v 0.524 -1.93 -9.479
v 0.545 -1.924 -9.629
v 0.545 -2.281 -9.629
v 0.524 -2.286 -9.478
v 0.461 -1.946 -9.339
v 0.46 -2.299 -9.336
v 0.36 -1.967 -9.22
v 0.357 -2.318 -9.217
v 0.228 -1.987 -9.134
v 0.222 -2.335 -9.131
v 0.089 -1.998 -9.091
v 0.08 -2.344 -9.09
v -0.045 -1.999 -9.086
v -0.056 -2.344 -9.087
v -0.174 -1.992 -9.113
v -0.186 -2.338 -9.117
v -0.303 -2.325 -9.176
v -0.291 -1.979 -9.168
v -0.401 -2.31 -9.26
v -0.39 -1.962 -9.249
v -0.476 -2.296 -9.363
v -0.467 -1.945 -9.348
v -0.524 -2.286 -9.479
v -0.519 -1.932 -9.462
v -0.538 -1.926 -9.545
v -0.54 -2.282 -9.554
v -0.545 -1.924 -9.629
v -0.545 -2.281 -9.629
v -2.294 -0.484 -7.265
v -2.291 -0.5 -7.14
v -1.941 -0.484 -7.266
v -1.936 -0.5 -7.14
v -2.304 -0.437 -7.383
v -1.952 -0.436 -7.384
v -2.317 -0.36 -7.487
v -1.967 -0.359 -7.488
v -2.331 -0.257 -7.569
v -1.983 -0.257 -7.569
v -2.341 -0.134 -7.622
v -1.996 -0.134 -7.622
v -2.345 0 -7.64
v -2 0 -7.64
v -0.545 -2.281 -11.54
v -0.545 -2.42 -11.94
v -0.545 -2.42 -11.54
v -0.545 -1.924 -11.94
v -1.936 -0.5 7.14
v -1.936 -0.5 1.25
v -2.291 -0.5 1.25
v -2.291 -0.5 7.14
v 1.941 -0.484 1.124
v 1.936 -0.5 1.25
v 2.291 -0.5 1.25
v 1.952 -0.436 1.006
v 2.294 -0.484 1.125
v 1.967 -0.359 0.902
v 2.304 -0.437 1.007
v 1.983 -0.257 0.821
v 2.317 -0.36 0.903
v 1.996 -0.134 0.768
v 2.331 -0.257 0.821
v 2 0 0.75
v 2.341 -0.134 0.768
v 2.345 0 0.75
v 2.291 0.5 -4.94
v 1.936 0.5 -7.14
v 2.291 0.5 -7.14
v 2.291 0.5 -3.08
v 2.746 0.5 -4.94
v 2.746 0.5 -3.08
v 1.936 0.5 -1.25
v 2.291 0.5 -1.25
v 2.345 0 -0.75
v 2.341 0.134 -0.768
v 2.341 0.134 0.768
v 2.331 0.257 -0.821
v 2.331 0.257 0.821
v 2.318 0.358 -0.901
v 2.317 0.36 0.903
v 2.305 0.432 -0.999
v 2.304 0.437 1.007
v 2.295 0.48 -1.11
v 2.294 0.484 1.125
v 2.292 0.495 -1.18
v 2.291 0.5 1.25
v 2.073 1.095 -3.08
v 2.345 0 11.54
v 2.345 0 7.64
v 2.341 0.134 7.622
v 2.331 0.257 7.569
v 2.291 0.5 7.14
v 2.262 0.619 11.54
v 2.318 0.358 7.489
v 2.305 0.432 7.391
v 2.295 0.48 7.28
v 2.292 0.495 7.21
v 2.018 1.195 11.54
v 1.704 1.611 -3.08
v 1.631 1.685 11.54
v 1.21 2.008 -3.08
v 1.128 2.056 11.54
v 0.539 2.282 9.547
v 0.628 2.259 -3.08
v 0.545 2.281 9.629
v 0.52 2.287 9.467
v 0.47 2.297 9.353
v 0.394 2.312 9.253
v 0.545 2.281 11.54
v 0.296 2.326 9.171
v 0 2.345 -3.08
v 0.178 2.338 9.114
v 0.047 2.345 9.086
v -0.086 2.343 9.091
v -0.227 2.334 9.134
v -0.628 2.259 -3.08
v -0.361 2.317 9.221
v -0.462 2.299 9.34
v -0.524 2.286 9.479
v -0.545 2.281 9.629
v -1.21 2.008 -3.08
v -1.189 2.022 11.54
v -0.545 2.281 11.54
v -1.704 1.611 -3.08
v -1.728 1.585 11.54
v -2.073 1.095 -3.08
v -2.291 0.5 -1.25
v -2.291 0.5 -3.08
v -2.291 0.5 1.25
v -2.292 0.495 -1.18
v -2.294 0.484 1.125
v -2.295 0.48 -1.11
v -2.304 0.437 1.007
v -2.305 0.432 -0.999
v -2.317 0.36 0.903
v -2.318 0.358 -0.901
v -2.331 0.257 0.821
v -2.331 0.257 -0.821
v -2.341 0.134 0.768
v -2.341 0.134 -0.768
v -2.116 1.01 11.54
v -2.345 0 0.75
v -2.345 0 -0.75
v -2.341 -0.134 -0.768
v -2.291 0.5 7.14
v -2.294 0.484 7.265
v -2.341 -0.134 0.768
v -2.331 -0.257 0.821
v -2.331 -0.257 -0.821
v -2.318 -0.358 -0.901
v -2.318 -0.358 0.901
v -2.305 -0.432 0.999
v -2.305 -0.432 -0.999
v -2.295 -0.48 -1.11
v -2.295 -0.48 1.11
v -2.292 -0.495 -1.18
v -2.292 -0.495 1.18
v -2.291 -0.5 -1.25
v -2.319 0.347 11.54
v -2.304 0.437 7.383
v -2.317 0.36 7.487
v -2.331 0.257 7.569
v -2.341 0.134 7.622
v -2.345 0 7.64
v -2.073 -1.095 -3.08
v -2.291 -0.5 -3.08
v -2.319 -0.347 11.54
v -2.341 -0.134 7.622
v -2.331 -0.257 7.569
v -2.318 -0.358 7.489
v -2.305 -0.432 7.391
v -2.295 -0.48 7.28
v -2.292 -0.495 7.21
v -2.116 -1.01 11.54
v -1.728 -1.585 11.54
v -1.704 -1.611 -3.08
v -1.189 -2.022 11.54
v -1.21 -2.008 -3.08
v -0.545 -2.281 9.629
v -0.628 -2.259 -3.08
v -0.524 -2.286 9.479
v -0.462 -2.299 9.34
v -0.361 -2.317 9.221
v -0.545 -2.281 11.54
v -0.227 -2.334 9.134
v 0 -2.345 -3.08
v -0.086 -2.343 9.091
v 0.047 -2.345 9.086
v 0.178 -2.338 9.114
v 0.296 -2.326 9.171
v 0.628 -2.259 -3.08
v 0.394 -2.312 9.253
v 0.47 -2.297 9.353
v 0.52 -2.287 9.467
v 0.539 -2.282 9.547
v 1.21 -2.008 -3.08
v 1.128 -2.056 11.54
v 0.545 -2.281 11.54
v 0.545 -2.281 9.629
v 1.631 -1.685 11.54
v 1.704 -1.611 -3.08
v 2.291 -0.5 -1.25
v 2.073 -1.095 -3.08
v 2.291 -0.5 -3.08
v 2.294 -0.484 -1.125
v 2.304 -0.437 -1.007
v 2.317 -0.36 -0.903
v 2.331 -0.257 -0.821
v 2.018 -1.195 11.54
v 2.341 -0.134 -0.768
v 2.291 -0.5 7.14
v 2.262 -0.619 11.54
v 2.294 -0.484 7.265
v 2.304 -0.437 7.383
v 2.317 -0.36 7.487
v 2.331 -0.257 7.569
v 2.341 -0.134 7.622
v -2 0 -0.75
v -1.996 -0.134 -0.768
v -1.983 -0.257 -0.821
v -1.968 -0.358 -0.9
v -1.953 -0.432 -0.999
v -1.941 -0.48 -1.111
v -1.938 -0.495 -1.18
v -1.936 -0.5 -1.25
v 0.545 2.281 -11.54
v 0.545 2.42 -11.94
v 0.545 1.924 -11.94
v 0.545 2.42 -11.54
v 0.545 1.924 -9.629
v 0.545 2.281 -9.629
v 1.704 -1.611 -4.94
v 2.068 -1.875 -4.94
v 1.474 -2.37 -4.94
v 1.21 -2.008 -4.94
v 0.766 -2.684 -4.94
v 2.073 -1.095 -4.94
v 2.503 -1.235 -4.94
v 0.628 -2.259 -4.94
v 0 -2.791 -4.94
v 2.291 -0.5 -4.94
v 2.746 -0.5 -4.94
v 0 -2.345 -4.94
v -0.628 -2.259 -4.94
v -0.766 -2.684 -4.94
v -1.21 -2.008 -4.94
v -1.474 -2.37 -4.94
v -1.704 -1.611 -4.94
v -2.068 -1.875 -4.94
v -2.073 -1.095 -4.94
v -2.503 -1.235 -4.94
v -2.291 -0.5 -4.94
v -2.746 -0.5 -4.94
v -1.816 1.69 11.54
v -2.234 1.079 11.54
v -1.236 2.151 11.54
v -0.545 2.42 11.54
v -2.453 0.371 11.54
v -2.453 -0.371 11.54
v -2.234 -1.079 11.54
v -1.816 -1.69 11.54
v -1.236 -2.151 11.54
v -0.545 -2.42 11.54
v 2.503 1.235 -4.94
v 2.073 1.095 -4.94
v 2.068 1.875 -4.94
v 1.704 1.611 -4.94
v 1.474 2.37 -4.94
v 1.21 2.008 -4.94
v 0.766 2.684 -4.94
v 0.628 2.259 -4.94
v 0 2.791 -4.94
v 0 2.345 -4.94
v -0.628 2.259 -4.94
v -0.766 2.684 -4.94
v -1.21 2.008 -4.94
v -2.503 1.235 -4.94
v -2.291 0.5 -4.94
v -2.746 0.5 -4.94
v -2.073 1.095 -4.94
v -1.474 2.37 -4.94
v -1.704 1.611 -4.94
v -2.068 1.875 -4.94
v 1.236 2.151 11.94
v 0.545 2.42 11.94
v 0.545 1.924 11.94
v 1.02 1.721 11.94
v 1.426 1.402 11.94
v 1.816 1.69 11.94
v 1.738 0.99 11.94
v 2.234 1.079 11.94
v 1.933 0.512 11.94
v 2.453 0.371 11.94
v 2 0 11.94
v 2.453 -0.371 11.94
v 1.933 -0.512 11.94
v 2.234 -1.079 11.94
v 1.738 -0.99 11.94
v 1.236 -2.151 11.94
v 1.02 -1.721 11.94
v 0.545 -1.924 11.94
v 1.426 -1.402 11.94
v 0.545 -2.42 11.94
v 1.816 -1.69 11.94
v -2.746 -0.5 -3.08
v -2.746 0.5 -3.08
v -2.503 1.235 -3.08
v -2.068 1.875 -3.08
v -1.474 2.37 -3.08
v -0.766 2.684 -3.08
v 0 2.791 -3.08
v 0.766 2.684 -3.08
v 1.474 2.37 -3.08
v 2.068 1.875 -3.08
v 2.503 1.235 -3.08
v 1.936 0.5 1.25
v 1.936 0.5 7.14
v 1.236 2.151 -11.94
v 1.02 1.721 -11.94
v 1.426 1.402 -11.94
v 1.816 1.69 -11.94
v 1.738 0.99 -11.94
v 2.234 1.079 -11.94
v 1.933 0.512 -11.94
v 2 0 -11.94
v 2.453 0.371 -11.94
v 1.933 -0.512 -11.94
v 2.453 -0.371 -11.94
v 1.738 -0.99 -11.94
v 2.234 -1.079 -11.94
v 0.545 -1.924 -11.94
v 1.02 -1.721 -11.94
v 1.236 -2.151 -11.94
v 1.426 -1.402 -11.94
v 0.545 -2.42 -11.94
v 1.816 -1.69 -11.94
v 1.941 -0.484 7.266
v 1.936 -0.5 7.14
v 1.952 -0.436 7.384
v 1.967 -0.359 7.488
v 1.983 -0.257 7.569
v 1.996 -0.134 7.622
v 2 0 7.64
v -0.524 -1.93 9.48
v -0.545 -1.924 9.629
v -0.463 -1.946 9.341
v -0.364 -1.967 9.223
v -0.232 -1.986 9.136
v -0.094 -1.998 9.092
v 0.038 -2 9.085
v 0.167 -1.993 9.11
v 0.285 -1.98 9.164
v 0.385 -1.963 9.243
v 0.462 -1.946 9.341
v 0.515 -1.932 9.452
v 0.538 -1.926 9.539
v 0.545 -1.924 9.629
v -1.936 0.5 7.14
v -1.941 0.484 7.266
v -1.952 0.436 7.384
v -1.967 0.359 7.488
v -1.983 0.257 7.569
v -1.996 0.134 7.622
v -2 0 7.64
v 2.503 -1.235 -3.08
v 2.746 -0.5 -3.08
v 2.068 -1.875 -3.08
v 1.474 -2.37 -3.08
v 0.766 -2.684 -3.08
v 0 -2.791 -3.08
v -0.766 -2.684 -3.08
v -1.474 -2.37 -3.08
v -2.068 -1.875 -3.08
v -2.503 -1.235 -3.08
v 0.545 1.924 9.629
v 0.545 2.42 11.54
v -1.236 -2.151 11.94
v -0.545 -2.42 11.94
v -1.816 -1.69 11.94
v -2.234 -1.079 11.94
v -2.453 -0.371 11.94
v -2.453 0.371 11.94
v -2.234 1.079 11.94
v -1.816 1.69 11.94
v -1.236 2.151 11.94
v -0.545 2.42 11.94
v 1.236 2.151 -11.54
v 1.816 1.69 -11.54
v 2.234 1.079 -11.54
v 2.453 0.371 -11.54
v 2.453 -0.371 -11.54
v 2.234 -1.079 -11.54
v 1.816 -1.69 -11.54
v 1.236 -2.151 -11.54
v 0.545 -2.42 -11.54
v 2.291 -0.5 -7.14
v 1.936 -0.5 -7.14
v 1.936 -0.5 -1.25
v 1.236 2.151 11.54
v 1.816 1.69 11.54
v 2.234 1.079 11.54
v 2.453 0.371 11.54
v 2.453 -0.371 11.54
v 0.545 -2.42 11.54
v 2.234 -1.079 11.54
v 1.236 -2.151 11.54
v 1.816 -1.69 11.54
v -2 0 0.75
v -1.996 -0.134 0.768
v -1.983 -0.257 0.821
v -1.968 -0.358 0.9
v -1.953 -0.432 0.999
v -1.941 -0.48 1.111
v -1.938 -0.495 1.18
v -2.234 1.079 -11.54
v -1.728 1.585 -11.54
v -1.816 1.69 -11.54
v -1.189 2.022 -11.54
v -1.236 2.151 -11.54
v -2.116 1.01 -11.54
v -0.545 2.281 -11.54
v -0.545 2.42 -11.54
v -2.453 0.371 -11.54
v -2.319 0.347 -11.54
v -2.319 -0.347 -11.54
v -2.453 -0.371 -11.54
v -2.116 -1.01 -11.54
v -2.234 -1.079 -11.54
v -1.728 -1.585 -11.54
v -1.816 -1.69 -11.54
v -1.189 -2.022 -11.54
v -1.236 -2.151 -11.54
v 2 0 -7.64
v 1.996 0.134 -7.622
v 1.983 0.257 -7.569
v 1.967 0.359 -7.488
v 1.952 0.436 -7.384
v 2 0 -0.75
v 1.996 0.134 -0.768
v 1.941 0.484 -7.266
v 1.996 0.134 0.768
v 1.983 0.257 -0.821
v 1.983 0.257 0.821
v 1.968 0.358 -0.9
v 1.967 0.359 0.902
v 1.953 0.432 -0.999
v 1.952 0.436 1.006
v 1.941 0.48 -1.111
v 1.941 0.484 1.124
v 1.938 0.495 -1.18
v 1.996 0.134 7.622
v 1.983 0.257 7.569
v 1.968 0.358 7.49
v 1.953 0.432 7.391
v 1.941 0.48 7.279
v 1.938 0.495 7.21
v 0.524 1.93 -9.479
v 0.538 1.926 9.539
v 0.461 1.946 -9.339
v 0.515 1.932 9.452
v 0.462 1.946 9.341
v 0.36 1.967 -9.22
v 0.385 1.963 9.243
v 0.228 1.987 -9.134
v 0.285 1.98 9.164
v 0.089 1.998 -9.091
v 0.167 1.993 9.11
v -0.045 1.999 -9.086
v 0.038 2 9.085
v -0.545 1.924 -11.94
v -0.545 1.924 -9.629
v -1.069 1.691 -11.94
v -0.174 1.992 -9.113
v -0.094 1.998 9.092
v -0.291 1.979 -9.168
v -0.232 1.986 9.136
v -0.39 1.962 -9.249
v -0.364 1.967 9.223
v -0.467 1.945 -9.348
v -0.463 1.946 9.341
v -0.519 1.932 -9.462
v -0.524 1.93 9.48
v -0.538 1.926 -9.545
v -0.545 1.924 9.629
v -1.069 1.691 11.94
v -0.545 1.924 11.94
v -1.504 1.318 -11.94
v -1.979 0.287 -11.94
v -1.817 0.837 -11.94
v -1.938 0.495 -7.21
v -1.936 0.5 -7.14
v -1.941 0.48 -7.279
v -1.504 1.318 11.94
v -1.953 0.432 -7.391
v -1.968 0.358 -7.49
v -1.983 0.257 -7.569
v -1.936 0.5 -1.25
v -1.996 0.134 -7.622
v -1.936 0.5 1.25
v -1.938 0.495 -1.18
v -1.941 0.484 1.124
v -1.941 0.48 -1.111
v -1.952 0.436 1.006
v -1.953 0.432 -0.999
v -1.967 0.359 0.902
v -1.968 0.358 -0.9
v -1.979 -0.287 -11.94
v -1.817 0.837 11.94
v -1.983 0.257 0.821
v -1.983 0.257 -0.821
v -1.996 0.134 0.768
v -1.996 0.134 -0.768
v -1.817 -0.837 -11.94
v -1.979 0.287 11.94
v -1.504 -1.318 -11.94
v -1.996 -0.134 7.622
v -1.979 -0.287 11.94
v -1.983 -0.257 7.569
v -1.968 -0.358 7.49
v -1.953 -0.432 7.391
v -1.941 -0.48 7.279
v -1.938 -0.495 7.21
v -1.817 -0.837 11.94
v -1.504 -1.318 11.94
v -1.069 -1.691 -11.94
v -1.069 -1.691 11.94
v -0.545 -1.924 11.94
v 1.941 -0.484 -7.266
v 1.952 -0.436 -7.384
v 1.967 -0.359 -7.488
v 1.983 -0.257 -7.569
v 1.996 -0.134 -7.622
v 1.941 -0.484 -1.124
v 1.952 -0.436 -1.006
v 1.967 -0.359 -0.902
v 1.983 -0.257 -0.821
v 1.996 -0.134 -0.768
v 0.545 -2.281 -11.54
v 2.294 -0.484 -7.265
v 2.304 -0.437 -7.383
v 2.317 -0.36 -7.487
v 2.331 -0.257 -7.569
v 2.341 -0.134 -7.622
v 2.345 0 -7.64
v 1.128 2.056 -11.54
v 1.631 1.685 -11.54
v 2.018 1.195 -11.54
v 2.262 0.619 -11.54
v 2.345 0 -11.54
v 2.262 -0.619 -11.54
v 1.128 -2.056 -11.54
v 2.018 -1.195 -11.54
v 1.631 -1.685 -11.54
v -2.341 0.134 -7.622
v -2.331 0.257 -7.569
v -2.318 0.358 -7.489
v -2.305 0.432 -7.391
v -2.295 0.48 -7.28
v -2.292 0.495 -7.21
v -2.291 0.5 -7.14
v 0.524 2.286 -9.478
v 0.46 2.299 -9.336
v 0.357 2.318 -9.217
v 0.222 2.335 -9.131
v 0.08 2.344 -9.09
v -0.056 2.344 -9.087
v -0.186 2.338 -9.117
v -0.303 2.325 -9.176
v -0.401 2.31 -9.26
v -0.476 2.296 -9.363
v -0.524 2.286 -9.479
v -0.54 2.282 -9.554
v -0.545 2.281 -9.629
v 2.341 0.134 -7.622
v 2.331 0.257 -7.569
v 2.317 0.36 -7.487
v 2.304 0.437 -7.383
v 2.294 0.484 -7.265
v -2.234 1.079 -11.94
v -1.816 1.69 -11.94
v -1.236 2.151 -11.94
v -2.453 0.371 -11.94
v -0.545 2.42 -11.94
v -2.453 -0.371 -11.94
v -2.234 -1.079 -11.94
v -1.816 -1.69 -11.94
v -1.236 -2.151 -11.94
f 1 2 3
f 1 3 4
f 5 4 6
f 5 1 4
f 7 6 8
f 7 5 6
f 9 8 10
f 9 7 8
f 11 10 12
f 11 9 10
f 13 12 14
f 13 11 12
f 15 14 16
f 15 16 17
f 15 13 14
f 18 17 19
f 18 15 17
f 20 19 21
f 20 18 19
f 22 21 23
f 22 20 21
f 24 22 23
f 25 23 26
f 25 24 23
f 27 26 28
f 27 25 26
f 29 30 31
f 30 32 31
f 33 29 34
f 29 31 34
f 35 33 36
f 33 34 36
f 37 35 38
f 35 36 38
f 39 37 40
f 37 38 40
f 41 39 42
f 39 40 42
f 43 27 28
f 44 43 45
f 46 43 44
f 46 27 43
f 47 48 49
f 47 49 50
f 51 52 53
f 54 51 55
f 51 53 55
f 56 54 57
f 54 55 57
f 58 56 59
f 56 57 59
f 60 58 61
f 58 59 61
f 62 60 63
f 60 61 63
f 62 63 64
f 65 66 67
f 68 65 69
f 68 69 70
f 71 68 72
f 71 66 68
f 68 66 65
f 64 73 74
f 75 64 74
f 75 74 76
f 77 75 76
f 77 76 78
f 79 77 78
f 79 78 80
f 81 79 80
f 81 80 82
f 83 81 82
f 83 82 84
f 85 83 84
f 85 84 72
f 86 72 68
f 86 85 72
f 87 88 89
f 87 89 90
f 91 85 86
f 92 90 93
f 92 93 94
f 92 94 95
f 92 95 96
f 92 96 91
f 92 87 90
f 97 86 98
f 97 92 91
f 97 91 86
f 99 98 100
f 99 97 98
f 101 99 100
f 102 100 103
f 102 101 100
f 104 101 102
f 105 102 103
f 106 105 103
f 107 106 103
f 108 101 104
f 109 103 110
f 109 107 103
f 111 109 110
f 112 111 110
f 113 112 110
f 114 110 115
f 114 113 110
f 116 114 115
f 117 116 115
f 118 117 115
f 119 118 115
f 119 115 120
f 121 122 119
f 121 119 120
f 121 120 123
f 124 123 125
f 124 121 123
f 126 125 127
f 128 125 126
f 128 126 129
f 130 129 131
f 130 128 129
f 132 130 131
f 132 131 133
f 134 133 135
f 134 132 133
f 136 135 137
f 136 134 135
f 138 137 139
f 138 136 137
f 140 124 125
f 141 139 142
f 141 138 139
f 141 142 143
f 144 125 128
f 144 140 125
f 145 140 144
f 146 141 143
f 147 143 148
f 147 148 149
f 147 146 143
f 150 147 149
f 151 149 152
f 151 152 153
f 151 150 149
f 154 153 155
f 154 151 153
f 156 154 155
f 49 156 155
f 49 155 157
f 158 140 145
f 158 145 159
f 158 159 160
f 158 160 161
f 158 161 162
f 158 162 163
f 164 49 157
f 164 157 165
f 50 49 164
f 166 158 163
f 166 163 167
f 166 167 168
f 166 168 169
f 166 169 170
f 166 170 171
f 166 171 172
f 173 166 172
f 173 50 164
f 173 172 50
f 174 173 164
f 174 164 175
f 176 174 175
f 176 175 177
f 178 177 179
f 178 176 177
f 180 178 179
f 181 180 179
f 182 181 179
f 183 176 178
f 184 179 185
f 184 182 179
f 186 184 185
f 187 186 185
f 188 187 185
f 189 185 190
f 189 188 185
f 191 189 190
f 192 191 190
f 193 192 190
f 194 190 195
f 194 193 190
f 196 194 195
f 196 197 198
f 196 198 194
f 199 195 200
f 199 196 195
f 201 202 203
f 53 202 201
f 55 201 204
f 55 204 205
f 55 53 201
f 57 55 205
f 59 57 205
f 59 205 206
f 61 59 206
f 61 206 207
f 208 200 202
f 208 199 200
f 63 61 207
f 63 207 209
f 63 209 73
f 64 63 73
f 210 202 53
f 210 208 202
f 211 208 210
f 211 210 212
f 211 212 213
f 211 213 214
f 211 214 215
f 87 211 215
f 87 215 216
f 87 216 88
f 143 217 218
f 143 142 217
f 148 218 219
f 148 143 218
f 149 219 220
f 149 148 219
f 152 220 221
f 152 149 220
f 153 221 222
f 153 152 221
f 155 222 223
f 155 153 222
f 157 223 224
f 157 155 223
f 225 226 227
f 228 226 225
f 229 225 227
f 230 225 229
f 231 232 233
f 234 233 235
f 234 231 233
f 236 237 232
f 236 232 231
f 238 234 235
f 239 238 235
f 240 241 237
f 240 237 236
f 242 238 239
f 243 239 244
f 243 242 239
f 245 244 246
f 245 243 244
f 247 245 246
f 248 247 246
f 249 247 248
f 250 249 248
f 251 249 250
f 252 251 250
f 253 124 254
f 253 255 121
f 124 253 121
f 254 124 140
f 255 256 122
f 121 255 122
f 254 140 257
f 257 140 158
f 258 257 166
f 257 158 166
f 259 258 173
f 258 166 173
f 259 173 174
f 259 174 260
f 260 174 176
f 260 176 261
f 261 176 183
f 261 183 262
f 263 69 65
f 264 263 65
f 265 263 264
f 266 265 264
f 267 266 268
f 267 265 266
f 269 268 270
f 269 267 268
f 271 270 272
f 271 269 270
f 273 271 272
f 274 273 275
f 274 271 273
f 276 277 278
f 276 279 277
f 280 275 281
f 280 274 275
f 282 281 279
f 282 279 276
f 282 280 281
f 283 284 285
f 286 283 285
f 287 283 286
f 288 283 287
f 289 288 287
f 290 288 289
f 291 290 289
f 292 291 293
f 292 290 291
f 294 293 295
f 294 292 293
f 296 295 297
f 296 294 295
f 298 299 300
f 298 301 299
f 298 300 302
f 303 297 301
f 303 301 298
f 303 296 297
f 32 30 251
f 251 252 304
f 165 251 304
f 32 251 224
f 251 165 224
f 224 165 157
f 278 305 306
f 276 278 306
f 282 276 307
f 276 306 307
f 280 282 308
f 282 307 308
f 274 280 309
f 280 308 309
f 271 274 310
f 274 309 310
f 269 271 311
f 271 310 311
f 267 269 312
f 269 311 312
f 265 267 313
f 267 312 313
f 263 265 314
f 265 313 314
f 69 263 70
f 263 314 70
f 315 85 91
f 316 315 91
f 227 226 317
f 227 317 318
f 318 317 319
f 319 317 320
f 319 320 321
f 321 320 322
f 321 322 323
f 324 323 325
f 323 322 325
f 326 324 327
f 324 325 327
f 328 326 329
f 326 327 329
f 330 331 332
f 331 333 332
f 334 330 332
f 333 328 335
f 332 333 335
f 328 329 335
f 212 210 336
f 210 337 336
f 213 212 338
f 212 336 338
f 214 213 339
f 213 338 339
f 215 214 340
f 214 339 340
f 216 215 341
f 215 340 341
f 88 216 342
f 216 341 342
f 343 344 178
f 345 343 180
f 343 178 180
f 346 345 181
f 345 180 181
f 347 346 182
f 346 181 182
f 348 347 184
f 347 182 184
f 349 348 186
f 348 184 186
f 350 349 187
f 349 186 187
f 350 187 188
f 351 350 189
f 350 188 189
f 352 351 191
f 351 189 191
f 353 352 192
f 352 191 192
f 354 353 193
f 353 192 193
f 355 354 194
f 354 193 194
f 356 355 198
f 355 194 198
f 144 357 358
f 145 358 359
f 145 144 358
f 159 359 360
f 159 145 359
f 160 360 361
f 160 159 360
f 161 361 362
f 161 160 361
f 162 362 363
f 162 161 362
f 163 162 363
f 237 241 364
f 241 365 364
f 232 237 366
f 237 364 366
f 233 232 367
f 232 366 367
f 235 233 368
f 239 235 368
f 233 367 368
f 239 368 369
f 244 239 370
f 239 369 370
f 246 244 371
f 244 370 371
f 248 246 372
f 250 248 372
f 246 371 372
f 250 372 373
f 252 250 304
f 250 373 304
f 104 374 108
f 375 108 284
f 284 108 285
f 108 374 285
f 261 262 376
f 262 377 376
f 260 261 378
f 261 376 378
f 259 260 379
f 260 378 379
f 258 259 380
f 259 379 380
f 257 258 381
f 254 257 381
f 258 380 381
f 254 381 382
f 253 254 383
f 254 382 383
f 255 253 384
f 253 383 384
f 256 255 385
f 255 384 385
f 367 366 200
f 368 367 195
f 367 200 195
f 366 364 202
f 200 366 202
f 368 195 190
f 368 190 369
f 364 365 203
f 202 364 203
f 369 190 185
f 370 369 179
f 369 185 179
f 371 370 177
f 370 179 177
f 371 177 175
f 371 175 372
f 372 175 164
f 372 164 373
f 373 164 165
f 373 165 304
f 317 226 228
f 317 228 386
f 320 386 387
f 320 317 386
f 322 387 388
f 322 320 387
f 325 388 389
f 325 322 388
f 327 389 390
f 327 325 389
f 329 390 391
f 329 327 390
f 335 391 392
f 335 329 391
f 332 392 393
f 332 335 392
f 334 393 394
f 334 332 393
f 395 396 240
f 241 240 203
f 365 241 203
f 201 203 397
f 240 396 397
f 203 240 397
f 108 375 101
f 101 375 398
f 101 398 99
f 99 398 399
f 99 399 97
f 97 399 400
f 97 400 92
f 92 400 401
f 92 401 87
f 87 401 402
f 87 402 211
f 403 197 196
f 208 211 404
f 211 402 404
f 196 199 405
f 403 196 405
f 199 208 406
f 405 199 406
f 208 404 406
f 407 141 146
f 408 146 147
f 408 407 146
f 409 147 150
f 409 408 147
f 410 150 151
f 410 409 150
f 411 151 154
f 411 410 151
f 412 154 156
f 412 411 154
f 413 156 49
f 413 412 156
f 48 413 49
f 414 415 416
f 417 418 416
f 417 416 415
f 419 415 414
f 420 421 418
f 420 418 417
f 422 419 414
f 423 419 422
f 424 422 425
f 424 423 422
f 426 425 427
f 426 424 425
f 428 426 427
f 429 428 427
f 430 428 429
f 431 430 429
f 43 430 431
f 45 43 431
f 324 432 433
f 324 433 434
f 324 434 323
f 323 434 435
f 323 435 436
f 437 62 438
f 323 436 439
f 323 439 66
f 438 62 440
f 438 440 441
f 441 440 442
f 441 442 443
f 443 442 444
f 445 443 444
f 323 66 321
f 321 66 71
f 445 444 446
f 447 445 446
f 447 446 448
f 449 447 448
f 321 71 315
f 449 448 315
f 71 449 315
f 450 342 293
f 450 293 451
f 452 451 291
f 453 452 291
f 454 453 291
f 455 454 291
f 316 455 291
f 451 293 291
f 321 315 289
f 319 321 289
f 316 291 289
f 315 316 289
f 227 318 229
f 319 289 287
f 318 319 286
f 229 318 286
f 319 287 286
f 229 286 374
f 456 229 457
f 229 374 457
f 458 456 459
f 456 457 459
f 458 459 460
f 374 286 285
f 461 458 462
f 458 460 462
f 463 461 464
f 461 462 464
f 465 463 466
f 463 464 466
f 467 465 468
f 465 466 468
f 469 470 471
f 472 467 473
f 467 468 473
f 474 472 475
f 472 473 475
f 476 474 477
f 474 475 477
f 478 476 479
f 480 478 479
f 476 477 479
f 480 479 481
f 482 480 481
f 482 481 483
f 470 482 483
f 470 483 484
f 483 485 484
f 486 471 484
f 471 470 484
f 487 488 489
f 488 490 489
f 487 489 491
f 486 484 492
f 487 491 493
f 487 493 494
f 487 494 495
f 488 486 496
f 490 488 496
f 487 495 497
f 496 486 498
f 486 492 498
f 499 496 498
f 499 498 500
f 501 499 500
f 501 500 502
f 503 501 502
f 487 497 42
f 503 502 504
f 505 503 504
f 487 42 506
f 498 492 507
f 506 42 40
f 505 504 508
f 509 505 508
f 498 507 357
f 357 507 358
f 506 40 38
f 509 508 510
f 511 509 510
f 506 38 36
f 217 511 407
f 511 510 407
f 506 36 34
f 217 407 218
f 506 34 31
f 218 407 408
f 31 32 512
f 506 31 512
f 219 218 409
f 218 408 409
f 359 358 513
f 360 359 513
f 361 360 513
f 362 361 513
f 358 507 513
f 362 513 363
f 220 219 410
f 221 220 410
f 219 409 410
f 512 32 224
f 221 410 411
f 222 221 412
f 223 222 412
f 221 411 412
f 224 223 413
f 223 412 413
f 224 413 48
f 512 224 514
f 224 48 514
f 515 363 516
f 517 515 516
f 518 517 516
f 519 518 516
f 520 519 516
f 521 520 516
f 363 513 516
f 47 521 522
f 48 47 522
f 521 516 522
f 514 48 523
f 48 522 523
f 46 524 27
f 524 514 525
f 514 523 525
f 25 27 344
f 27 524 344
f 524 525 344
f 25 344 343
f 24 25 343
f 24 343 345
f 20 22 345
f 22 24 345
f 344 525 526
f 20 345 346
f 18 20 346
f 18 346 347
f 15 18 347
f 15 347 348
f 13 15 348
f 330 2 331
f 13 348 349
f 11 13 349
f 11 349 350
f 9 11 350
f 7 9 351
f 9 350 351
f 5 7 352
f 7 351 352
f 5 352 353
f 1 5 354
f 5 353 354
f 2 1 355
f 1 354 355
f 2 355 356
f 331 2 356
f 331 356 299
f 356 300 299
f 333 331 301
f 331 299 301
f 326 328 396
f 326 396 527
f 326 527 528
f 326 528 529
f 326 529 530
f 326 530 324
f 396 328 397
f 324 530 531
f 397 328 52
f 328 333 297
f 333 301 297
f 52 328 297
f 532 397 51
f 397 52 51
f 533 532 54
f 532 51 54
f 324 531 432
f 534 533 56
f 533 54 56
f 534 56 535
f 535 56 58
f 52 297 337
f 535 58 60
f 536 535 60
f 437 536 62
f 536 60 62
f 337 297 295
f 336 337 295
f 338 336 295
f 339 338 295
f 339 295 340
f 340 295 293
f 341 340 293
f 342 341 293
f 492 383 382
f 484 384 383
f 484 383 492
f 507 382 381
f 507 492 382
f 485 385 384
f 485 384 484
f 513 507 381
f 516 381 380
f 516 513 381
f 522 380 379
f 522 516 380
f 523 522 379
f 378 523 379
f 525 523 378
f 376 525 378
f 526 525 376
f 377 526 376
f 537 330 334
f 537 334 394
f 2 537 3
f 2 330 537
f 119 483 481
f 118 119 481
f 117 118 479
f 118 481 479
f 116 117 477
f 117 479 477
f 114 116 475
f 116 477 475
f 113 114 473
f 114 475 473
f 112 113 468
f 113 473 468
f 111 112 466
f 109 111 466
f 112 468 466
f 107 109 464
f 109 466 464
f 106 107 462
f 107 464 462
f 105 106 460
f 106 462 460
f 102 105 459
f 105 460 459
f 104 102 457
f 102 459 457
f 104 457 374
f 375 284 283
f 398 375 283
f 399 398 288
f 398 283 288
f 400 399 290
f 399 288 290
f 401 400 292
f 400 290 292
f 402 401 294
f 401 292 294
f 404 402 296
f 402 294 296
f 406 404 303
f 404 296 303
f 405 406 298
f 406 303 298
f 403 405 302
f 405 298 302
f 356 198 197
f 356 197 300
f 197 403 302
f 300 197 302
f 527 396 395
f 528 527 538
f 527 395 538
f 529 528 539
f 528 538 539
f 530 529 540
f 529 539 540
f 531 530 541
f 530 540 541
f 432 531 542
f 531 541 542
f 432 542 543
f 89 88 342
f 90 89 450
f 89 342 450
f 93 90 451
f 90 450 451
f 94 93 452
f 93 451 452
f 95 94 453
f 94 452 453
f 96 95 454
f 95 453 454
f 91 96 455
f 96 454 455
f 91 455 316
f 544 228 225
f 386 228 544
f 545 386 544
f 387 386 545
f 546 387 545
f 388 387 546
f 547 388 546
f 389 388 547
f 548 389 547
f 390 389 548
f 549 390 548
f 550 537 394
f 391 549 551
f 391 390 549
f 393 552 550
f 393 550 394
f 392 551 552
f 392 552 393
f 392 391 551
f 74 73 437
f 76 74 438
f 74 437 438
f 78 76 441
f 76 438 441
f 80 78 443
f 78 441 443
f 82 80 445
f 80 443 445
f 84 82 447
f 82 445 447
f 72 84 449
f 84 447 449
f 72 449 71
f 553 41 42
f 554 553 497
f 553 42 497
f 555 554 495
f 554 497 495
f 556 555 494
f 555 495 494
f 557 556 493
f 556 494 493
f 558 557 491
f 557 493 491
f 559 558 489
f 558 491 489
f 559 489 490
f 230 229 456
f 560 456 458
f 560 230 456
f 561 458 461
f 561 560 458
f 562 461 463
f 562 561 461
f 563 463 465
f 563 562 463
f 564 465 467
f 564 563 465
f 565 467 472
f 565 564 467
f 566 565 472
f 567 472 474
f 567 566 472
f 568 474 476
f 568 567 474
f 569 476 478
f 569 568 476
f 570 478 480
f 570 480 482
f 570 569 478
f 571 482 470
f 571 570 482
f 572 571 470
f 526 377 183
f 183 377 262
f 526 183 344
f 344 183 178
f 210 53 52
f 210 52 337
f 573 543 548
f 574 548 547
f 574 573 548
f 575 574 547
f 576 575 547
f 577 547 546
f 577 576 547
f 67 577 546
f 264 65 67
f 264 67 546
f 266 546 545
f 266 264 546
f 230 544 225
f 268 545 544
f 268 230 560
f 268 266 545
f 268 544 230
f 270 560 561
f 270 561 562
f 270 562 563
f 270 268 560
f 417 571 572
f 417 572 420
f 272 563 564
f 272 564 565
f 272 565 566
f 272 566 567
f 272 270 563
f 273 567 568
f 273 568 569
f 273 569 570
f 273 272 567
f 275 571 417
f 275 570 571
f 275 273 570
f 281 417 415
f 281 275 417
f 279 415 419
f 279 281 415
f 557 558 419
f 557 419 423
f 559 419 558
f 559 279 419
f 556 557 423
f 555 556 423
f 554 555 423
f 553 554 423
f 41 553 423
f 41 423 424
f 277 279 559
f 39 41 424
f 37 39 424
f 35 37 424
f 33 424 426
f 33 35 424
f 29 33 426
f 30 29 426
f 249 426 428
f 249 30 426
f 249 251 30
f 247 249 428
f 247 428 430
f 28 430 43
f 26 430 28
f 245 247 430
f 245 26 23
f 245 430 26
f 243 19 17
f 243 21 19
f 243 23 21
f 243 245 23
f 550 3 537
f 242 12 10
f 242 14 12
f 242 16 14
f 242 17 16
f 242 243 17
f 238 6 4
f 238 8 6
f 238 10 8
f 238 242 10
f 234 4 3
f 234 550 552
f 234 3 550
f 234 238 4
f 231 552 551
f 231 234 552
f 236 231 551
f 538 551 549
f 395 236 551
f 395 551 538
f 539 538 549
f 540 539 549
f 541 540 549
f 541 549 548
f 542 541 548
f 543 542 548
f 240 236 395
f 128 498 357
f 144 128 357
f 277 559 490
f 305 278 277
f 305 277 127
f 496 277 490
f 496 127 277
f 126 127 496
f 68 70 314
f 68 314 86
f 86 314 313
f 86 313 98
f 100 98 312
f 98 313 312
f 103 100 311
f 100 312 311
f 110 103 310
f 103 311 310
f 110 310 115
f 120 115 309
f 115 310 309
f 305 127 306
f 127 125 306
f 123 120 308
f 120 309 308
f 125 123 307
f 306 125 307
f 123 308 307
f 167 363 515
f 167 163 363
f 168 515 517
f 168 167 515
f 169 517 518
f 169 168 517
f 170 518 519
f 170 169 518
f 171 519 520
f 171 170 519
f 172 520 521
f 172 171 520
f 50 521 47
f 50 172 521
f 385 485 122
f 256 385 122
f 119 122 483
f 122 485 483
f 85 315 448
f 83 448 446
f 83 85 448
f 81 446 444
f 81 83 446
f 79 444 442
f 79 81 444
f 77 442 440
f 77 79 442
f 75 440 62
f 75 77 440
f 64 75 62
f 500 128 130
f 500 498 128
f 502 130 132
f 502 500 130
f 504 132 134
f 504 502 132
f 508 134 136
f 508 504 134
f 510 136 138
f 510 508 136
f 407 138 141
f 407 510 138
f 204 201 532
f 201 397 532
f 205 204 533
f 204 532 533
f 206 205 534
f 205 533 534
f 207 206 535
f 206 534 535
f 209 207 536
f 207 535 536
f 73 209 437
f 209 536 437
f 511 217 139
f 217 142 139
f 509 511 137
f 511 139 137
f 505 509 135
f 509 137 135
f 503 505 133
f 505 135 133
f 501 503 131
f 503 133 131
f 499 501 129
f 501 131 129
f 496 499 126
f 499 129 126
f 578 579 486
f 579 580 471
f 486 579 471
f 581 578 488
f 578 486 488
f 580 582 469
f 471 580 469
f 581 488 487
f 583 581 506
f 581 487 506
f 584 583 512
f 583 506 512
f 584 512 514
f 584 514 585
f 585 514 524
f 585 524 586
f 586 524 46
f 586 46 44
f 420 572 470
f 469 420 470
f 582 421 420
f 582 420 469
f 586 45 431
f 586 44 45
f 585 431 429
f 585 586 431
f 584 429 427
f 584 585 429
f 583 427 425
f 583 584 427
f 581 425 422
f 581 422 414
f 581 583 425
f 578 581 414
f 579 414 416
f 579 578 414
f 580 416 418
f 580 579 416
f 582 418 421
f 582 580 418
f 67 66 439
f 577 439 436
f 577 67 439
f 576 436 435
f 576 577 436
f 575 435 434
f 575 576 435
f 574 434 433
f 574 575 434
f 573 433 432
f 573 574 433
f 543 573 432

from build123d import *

# Parameters (mm, degrees)
F0_R      = 2.345
F1_DEPTH  = 11.94
F2_DEPTH  = 11.94
F5_DEPTH  = 166.5
F6_DEPTH  = 12.5
F7_W      = 0.5
F7_H      = 1.86
F4_W      = 1
F4_H      = 6.89
F9_DEPTH  = 12.5
F10_R     = 2
F11_DEPTH = 20.5
F12_W     = 0.2
F12_H     = 0.4
F14_DEPTH = 12.5
F15_DEPTH = 25
F16_DEPTH = 12.5
F17_R     = 0.4999


# Not quite as in the source:
# - a fillet or chamfer is up to 0.001 mm smaller than in the source, because OpenCascade refuses the exact size
# - a pattern or mirror of a feature is missing from the dataset's text; its kind, count and spacing are read off the source's solid


with BuildPart() as f1:
    # F0 (on Top) → F1 (new body)
    with BuildSketch(Plane.XY):
        Circle(F0_R)
    extrude(amount=F1_DEPTH)

    # F0 (on Top) → F2 (join)
    with BuildSketch(Plane.XY):
        Circle(F0_R)
    extrude(amount=-F2_DEPTH)

    # F3 (on Front) → F5 (cut, symmetric)
    with BuildSketch(Plane.XZ):
        with BuildLine():
            Line((-0.545, -12.9641438561), (0.545, -12.9641438561))
            Line((0.545, -12.9641438561), (0.545, -9.629))
            ThreePointArc((0.545, -9.629), (0, -10.174), (-0.545, -9.629))
            Line((-0.545, -9.629), (-0.545, -12.9641438561))
        make_face()
        with BuildLine():
            ThreePointArc((-0.545, -9.629), (0, -10.174), (0.545, -9.629))
            Line((0.545, -9.629), (-0.545, -9.629))
        make_face()
        with BuildLine():
            Line((-0.545, -9.629), (0.545, -9.629))
            ThreePointArc((0.545, -9.629), (0, -9.084), (-0.545, -9.629))
        make_face()
        with BuildLine():
            ThreePointArc((-0.545, 9.629), (0, 9.084), (0.545, 9.629))
            ThreePointArc((0.545, 9.629), (0, 10.174), (-0.545, 9.629))
        make_face()
        with BuildLine():
            ThreePointArc((-0.545, 9.629), (0, 10.174), (0.545, 9.629))
            Line((0.545, 9.629), (0.545, 12.9641438561))
            Line((0.545, 12.9641438561), (-0.545, 12.9641438561))
            Line((-0.545, 12.9641438561), (-0.545, 9.629))
        make_face()
    extrude(amount=F5_DEPTH, both=True, mode=Mode.SUBTRACT)

    # F3 (on Front) → F6 (cut, symmetric)
    with BuildSketch(Plane.XZ):
        with BuildLine():
            Line((-0.545, -12.9641438561), (0.545, -12.9641438561))
            Line((0.545, -12.9641438561), (0.545, -9.629))
            ThreePointArc((0.545, -9.629), (0, -10.174), (-0.545, -9.629))
            Line((-0.545, -9.629), (-0.545, -12.9641438561))
        make_face()
        with BuildLine():
            ThreePointArc((-0.545, -9.629), (0, -10.174), (0.545, -9.629))
            Line((0.545, -9.629), (-0.545, -9.629))
        make_face()
        with BuildLine():
            Line((-0.545, -9.629), (0.545, -9.629))
            ThreePointArc((0.545, -9.629), (0, -9.084), (-0.545, -9.629))
        make_face()
        with BuildLine():
            ThreePointArc((-0.545, 9.629), (0, 9.084), (0.545, 9.629))
            ThreePointArc((0.545, 9.629), (0, 10.174), (-0.545, 9.629))
        make_face()
        with BuildLine():
            ThreePointArc((-0.545, 9.629), (0, 10.174), (0.545, 9.629))
            Line((0.545, 9.629), (0.545, 12.9641438561))
            Line((0.545, 12.9641438561), (-0.545, 12.9641438561))
            Line((-0.545, 12.9641438561), (-0.545, 9.629))
        make_face()
    extrude(amount=F6_DEPTH, both=True, mode=Mode.SUBTRACT)

    # F7 (on Front) → F8 (revolve)
    with BuildSketch(Plane.XZ):
        with Locations((-2.5410750752, -4.01)):
            Rectangle(F7_W, F7_H)
    revolve(axis=Axis((0, 0, 0), (0, 0, -1)))

    # F4 (on Right) → F9 (cut, symmetric)
    with BuildSketch(Plane.YZ):
        with Locations((0, -4.195)):
            Rectangle(F4_W, F4_H)
        with Locations((0, 4.195)):
            Rectangle(F4_W, F4_H)
    extrude(amount=F9_DEPTH, both=True, mode=Mode.SUBTRACT)

    # F10 (on Top) → F11 (cut, symmetric)
    with BuildSketch(Plane.XY):
        Circle(F10_R)
    extrude(amount=F11_DEPTH, both=True, mode=Mode.SUBTRACT)

    # F12 (on Right) → F13 (revolve)
    with BuildSketch(Plane.YZ):
        with Locations((2.380789337, 11.74)):
            Rectangle(F12_W, F12_H)
    f13 = revolve(axis=Axis((0, 0, 0), (0, 0, -1)))

    # F13_copies: F13 across plane
    add(f13.mirror(Plane(origin=(0, 0, 0), x_dir=(-1, 0, 0), z_dir=(0, 0, -1))))

    # F3 (on Front) → F14 (cut, symmetric)
    with BuildSketch(Plane.XZ):
        with BuildLine():
            Line((-0.545, -12.9641438561), (0.545, -12.9641438561))
            Line((0.545, -12.9641438561), (0.545, -9.629))
            ThreePointArc((0.545, -9.629), (0, -10.174), (-0.545, -9.629))
            Line((-0.545, -9.629), (-0.545, -12.9641438561))
        make_face()
        with BuildLine():
            ThreePointArc((-0.545, -9.629), (0, -10.174), (0.545, -9.629))
            Line((0.545, -9.629), (-0.545, -9.629))
        make_face()
        with BuildLine():
            Line((-0.545, -9.629), (0.545, -9.629))
            ThreePointArc((0.545, -9.629), (0, -9.084), (-0.545, -9.629))
        make_face()
        with BuildLine():
            ThreePointArc((-0.545, 9.629), (0, 9.084), (0.545, 9.629))
            ThreePointArc((0.545, 9.629), (0, 10.174), (-0.545, 9.629))
        make_face()
        with BuildLine():
            ThreePointArc((-0.545, 9.629), (0, 10.174), (0.545, 9.629))
            Line((0.545, 9.629), (0.545, 12.9641438561))
            Line((0.545, 12.9641438561), (-0.545, 12.9641438561))
            Line((-0.545, 12.9641438561), (-0.545, 9.629))
        make_face()
    extrude(amount=F14_DEPTH, both=True, mode=Mode.SUBTRACT)

    # F3 (on Front) → F15 (cut)
    with BuildSketch(Plane.XZ):
        with BuildLine():
            Line((-0.545, -12.9641438561), (0.545, -12.9641438561))
            Line((0.545, -12.9641438561), (0.545, -9.629))
            ThreePointArc((0.545, -9.629), (0, -10.174), (-0.545, -9.629))
            Line((-0.545, -9.629), (-0.545, -12.9641438561))
        make_face()
        with BuildLine():
            ThreePointArc((-0.545, -9.629), (0, -10.174), (0.545, -9.629))
            Line((0.545, -9.629), (-0.545, -9.629))
        make_face()
        with BuildLine():
            Line((-0.545, -9.629), (0.545, -9.629))
            ThreePointArc((0.545, -9.629), (0, -9.084), (-0.545, -9.629))
        make_face()
        with BuildLine():
            ThreePointArc((-0.545, 9.629), (0, 9.084), (0.545, 9.629))
            ThreePointArc((0.545, 9.629), (0, 10.174), (-0.545, 9.629))
        make_face()
        with BuildLine():
            ThreePointArc((-0.545, 9.629), (0, 10.174), (0.545, 9.629))
            Line((0.545, 9.629), (0.545, 12.9641438561))
            Line((0.545, 12.9641438561), (-0.545, 12.9641438561))
            Line((-0.545, 12.9641438561), (-0.545, 9.629))
        make_face()
    extrude(amount=-F15_DEPTH, mode=Mode.SUBTRACT)

    # F3 (on Front) → F16 (cut, symmetric)
    with BuildSketch(Plane.XZ):
        with BuildLine():
            Line((-0.545, -12.9641438561), (0.545, -12.9641438561))
            Line((0.545, -12.9641438561), (0.545, -9.629))
            ThreePointArc((0.545, -9.629), (0, -10.174), (-0.545, -9.629))
            Line((-0.545, -9.629), (-0.545, -12.9641438561))
        make_face()
        with BuildLine():
            ThreePointArc((-0.545, -9.629), (0, -10.174), (0.545, -9.629))
            Line((0.545, -9.629), (-0.545, -9.629))
        make_face()
        with BuildLine():
            Line((-0.545, -9.629), (0.545, -9.629))
            ThreePointArc((0.545, -9.629), (0, -9.084), (-0.545, -9.629))
        make_face()
        with BuildLine():
            ThreePointArc((-0.545, 9.629), (0, 9.084), (0.545, 9.629))
            ThreePointArc((0.545, 9.629), (0, 10.174), (-0.545, 9.629))
        make_face()
        with BuildLine():
            ThreePointArc((-0.545, 9.629), (0, 10.174), (0.545, 9.629))
            Line((0.545, 9.629), (0.545, 12.9641438561))
            Line((0.545, 12.9641438561), (-0.545, 12.9641438561))
            Line((-0.545, 12.9641438561), (-0.545, 9.629))
        make_face()
    extrude(amount=F16_DEPTH, both=True, mode=Mode.SUBTRACT)

    # F17 (radius 0.5 in the source; OpenCascade refuses exactly that, so slightly less here)
    f17_edges = [f1.edges().sort_by_distance(p)[0] for p in [
        (2.113783, 0.5, 0.75),
        (-2.113783, 0.5, 0.75),
        (2.113783, -0.5, 0.75),
        (-2.113783, -0.5, 0.75),
        (2.113783, -0.5, -0.75),
        (-2.113783, -0.5, -0.75),
        (2.113783, 0.5, -0.75),
        (-2.113783, 0.5, -0.75),
        (-2.113783, -0.5, -7.64),
        (2.113783, -0.5, -7.64),
        (2.113783, 0.5, -7.64),
        (-2.113783, 0.5, -7.64),
        (2.113783, -0.5, 7.64),
        (-2.113783, -0.5, 7.64),
        (2.113783, 0.5, 7.64),
        (-2.113783, 0.5, 7.64),
    ]]
    fillet(f17_edges, radius=F17_R)


solid = f1.part
